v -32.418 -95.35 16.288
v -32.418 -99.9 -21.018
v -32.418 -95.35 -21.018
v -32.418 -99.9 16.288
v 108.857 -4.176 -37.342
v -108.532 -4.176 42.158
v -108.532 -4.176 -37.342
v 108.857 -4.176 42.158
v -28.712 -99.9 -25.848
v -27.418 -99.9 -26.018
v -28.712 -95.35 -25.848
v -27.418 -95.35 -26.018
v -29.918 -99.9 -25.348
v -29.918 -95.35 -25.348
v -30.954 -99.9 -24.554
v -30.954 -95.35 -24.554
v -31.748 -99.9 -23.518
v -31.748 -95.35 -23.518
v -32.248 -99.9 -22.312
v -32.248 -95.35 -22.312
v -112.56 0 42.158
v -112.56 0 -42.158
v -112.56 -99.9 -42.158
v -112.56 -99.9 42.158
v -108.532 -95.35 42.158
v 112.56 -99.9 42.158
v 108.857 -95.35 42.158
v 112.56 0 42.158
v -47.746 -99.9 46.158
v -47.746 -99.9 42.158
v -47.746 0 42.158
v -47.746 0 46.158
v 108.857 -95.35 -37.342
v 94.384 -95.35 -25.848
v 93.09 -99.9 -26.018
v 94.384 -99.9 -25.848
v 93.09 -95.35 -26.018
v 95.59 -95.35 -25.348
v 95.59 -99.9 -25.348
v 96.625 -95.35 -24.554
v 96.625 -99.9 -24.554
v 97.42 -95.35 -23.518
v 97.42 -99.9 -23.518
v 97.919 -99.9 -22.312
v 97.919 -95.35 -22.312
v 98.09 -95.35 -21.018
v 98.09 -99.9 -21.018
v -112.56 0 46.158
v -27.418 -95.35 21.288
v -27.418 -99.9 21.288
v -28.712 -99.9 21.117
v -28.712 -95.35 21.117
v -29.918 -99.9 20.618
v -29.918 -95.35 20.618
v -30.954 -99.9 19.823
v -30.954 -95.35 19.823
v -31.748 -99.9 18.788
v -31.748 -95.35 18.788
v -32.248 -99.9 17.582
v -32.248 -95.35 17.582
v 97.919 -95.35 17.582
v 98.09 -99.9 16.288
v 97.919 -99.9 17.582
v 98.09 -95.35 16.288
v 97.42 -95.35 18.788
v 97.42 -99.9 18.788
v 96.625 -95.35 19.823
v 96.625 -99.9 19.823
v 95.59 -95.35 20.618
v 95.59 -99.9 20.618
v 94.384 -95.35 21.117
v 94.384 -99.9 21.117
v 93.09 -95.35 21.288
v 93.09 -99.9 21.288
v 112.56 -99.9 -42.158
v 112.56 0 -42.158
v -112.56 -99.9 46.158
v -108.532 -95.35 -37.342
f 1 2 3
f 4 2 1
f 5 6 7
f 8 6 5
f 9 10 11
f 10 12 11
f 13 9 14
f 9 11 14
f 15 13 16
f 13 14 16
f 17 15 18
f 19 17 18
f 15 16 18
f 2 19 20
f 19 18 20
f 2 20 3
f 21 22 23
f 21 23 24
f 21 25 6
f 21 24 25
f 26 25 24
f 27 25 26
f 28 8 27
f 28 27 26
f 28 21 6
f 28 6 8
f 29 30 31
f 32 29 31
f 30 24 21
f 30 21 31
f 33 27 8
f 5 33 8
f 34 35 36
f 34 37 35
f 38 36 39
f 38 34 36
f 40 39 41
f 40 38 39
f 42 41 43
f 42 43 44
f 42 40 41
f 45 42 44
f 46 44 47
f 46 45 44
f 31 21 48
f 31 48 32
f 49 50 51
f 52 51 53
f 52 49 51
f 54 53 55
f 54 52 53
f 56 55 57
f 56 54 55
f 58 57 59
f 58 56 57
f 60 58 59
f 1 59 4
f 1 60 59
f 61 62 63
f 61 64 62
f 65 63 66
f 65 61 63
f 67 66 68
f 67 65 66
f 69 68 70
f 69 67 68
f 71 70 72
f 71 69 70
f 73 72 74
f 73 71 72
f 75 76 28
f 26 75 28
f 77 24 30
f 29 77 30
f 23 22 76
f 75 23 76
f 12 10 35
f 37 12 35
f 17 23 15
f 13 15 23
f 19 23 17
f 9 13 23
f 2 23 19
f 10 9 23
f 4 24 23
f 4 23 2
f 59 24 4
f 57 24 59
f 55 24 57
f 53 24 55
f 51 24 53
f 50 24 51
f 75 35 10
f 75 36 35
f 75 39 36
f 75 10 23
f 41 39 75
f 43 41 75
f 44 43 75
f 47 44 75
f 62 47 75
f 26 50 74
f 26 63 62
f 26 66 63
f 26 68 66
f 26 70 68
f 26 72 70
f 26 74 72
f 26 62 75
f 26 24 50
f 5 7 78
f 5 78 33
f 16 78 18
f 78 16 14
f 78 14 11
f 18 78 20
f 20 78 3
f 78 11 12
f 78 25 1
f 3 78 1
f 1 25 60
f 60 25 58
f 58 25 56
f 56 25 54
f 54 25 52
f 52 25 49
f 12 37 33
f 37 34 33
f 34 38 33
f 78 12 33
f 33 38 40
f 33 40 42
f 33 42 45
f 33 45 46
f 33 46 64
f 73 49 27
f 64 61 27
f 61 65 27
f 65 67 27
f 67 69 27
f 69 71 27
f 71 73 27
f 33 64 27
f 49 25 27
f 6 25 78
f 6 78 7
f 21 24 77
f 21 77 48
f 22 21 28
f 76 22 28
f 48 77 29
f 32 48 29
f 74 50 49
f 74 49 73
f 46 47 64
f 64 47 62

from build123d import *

# Parameters (mm, degrees)
F0_W     = 225.119262
F0_H     = 84.315368
F1_DEPTH = 99.9
F2_W     = 217.388965
F2_H     = 91.173579
F3_DEPTH = 79.5
F4_W     = 64.813617
F4_H     = 99.9
F5_DEPTH = 4
F6_W     = 130.507961
F6_H     = 47.305657
F7_DEPTH = 25
F8_R     = 5


with BuildPart() as f1:
    # F0 (on Front) → F1 (new body)
    with BuildSketch(Plane.XZ):
        Rectangle(F0_W, F0_H)
    extrude(amount=F1_DEPTH)

    # F2 (on face) → F3 (cut)
    with BuildSketch(Plane.XY.offset(42.157684)):
        with Locations((0.162233, -49.763028)):
            Rectangle(F2_W, F2_H)
    extrude(amount=-F3_DEPTH, mode=Mode.SUBTRACT)

    # F6 (on face) → F7 (cut)
    with BuildSketch(Plane.XZ.offset(99.9)):
        with Locations((32.835692, -2.365282)):
            Rectangle(F6_W, F6_H)
    extrude(amount=-F7_DEPTH, mode=Mode.SUBTRACT)

    # F8
    f8_edges = [f1.edges().sort_by_distance(p)[0] for p in [
        (-32.418288, -97.624909, -26.018111),
        (-32.418288, -97.624909, 21.287546),
        (98.089673, -97.624909, 21.287546),
        (98.089673, -97.624909, -26.018111),
    ]]
    fillet(f8_edges, radius=F8_R)


with BuildPart() as f5:
    # F4 (on face) → F5 (new body)
    with BuildSketch(Plane.XY.offset(42.157684)):
        with Locations((-80.152822, -49.95)):
            Rectangle(F4_W, F4_H)
    extrude(amount=F5_DEPTH)


solid = Compound([f1.part, f5.part])
